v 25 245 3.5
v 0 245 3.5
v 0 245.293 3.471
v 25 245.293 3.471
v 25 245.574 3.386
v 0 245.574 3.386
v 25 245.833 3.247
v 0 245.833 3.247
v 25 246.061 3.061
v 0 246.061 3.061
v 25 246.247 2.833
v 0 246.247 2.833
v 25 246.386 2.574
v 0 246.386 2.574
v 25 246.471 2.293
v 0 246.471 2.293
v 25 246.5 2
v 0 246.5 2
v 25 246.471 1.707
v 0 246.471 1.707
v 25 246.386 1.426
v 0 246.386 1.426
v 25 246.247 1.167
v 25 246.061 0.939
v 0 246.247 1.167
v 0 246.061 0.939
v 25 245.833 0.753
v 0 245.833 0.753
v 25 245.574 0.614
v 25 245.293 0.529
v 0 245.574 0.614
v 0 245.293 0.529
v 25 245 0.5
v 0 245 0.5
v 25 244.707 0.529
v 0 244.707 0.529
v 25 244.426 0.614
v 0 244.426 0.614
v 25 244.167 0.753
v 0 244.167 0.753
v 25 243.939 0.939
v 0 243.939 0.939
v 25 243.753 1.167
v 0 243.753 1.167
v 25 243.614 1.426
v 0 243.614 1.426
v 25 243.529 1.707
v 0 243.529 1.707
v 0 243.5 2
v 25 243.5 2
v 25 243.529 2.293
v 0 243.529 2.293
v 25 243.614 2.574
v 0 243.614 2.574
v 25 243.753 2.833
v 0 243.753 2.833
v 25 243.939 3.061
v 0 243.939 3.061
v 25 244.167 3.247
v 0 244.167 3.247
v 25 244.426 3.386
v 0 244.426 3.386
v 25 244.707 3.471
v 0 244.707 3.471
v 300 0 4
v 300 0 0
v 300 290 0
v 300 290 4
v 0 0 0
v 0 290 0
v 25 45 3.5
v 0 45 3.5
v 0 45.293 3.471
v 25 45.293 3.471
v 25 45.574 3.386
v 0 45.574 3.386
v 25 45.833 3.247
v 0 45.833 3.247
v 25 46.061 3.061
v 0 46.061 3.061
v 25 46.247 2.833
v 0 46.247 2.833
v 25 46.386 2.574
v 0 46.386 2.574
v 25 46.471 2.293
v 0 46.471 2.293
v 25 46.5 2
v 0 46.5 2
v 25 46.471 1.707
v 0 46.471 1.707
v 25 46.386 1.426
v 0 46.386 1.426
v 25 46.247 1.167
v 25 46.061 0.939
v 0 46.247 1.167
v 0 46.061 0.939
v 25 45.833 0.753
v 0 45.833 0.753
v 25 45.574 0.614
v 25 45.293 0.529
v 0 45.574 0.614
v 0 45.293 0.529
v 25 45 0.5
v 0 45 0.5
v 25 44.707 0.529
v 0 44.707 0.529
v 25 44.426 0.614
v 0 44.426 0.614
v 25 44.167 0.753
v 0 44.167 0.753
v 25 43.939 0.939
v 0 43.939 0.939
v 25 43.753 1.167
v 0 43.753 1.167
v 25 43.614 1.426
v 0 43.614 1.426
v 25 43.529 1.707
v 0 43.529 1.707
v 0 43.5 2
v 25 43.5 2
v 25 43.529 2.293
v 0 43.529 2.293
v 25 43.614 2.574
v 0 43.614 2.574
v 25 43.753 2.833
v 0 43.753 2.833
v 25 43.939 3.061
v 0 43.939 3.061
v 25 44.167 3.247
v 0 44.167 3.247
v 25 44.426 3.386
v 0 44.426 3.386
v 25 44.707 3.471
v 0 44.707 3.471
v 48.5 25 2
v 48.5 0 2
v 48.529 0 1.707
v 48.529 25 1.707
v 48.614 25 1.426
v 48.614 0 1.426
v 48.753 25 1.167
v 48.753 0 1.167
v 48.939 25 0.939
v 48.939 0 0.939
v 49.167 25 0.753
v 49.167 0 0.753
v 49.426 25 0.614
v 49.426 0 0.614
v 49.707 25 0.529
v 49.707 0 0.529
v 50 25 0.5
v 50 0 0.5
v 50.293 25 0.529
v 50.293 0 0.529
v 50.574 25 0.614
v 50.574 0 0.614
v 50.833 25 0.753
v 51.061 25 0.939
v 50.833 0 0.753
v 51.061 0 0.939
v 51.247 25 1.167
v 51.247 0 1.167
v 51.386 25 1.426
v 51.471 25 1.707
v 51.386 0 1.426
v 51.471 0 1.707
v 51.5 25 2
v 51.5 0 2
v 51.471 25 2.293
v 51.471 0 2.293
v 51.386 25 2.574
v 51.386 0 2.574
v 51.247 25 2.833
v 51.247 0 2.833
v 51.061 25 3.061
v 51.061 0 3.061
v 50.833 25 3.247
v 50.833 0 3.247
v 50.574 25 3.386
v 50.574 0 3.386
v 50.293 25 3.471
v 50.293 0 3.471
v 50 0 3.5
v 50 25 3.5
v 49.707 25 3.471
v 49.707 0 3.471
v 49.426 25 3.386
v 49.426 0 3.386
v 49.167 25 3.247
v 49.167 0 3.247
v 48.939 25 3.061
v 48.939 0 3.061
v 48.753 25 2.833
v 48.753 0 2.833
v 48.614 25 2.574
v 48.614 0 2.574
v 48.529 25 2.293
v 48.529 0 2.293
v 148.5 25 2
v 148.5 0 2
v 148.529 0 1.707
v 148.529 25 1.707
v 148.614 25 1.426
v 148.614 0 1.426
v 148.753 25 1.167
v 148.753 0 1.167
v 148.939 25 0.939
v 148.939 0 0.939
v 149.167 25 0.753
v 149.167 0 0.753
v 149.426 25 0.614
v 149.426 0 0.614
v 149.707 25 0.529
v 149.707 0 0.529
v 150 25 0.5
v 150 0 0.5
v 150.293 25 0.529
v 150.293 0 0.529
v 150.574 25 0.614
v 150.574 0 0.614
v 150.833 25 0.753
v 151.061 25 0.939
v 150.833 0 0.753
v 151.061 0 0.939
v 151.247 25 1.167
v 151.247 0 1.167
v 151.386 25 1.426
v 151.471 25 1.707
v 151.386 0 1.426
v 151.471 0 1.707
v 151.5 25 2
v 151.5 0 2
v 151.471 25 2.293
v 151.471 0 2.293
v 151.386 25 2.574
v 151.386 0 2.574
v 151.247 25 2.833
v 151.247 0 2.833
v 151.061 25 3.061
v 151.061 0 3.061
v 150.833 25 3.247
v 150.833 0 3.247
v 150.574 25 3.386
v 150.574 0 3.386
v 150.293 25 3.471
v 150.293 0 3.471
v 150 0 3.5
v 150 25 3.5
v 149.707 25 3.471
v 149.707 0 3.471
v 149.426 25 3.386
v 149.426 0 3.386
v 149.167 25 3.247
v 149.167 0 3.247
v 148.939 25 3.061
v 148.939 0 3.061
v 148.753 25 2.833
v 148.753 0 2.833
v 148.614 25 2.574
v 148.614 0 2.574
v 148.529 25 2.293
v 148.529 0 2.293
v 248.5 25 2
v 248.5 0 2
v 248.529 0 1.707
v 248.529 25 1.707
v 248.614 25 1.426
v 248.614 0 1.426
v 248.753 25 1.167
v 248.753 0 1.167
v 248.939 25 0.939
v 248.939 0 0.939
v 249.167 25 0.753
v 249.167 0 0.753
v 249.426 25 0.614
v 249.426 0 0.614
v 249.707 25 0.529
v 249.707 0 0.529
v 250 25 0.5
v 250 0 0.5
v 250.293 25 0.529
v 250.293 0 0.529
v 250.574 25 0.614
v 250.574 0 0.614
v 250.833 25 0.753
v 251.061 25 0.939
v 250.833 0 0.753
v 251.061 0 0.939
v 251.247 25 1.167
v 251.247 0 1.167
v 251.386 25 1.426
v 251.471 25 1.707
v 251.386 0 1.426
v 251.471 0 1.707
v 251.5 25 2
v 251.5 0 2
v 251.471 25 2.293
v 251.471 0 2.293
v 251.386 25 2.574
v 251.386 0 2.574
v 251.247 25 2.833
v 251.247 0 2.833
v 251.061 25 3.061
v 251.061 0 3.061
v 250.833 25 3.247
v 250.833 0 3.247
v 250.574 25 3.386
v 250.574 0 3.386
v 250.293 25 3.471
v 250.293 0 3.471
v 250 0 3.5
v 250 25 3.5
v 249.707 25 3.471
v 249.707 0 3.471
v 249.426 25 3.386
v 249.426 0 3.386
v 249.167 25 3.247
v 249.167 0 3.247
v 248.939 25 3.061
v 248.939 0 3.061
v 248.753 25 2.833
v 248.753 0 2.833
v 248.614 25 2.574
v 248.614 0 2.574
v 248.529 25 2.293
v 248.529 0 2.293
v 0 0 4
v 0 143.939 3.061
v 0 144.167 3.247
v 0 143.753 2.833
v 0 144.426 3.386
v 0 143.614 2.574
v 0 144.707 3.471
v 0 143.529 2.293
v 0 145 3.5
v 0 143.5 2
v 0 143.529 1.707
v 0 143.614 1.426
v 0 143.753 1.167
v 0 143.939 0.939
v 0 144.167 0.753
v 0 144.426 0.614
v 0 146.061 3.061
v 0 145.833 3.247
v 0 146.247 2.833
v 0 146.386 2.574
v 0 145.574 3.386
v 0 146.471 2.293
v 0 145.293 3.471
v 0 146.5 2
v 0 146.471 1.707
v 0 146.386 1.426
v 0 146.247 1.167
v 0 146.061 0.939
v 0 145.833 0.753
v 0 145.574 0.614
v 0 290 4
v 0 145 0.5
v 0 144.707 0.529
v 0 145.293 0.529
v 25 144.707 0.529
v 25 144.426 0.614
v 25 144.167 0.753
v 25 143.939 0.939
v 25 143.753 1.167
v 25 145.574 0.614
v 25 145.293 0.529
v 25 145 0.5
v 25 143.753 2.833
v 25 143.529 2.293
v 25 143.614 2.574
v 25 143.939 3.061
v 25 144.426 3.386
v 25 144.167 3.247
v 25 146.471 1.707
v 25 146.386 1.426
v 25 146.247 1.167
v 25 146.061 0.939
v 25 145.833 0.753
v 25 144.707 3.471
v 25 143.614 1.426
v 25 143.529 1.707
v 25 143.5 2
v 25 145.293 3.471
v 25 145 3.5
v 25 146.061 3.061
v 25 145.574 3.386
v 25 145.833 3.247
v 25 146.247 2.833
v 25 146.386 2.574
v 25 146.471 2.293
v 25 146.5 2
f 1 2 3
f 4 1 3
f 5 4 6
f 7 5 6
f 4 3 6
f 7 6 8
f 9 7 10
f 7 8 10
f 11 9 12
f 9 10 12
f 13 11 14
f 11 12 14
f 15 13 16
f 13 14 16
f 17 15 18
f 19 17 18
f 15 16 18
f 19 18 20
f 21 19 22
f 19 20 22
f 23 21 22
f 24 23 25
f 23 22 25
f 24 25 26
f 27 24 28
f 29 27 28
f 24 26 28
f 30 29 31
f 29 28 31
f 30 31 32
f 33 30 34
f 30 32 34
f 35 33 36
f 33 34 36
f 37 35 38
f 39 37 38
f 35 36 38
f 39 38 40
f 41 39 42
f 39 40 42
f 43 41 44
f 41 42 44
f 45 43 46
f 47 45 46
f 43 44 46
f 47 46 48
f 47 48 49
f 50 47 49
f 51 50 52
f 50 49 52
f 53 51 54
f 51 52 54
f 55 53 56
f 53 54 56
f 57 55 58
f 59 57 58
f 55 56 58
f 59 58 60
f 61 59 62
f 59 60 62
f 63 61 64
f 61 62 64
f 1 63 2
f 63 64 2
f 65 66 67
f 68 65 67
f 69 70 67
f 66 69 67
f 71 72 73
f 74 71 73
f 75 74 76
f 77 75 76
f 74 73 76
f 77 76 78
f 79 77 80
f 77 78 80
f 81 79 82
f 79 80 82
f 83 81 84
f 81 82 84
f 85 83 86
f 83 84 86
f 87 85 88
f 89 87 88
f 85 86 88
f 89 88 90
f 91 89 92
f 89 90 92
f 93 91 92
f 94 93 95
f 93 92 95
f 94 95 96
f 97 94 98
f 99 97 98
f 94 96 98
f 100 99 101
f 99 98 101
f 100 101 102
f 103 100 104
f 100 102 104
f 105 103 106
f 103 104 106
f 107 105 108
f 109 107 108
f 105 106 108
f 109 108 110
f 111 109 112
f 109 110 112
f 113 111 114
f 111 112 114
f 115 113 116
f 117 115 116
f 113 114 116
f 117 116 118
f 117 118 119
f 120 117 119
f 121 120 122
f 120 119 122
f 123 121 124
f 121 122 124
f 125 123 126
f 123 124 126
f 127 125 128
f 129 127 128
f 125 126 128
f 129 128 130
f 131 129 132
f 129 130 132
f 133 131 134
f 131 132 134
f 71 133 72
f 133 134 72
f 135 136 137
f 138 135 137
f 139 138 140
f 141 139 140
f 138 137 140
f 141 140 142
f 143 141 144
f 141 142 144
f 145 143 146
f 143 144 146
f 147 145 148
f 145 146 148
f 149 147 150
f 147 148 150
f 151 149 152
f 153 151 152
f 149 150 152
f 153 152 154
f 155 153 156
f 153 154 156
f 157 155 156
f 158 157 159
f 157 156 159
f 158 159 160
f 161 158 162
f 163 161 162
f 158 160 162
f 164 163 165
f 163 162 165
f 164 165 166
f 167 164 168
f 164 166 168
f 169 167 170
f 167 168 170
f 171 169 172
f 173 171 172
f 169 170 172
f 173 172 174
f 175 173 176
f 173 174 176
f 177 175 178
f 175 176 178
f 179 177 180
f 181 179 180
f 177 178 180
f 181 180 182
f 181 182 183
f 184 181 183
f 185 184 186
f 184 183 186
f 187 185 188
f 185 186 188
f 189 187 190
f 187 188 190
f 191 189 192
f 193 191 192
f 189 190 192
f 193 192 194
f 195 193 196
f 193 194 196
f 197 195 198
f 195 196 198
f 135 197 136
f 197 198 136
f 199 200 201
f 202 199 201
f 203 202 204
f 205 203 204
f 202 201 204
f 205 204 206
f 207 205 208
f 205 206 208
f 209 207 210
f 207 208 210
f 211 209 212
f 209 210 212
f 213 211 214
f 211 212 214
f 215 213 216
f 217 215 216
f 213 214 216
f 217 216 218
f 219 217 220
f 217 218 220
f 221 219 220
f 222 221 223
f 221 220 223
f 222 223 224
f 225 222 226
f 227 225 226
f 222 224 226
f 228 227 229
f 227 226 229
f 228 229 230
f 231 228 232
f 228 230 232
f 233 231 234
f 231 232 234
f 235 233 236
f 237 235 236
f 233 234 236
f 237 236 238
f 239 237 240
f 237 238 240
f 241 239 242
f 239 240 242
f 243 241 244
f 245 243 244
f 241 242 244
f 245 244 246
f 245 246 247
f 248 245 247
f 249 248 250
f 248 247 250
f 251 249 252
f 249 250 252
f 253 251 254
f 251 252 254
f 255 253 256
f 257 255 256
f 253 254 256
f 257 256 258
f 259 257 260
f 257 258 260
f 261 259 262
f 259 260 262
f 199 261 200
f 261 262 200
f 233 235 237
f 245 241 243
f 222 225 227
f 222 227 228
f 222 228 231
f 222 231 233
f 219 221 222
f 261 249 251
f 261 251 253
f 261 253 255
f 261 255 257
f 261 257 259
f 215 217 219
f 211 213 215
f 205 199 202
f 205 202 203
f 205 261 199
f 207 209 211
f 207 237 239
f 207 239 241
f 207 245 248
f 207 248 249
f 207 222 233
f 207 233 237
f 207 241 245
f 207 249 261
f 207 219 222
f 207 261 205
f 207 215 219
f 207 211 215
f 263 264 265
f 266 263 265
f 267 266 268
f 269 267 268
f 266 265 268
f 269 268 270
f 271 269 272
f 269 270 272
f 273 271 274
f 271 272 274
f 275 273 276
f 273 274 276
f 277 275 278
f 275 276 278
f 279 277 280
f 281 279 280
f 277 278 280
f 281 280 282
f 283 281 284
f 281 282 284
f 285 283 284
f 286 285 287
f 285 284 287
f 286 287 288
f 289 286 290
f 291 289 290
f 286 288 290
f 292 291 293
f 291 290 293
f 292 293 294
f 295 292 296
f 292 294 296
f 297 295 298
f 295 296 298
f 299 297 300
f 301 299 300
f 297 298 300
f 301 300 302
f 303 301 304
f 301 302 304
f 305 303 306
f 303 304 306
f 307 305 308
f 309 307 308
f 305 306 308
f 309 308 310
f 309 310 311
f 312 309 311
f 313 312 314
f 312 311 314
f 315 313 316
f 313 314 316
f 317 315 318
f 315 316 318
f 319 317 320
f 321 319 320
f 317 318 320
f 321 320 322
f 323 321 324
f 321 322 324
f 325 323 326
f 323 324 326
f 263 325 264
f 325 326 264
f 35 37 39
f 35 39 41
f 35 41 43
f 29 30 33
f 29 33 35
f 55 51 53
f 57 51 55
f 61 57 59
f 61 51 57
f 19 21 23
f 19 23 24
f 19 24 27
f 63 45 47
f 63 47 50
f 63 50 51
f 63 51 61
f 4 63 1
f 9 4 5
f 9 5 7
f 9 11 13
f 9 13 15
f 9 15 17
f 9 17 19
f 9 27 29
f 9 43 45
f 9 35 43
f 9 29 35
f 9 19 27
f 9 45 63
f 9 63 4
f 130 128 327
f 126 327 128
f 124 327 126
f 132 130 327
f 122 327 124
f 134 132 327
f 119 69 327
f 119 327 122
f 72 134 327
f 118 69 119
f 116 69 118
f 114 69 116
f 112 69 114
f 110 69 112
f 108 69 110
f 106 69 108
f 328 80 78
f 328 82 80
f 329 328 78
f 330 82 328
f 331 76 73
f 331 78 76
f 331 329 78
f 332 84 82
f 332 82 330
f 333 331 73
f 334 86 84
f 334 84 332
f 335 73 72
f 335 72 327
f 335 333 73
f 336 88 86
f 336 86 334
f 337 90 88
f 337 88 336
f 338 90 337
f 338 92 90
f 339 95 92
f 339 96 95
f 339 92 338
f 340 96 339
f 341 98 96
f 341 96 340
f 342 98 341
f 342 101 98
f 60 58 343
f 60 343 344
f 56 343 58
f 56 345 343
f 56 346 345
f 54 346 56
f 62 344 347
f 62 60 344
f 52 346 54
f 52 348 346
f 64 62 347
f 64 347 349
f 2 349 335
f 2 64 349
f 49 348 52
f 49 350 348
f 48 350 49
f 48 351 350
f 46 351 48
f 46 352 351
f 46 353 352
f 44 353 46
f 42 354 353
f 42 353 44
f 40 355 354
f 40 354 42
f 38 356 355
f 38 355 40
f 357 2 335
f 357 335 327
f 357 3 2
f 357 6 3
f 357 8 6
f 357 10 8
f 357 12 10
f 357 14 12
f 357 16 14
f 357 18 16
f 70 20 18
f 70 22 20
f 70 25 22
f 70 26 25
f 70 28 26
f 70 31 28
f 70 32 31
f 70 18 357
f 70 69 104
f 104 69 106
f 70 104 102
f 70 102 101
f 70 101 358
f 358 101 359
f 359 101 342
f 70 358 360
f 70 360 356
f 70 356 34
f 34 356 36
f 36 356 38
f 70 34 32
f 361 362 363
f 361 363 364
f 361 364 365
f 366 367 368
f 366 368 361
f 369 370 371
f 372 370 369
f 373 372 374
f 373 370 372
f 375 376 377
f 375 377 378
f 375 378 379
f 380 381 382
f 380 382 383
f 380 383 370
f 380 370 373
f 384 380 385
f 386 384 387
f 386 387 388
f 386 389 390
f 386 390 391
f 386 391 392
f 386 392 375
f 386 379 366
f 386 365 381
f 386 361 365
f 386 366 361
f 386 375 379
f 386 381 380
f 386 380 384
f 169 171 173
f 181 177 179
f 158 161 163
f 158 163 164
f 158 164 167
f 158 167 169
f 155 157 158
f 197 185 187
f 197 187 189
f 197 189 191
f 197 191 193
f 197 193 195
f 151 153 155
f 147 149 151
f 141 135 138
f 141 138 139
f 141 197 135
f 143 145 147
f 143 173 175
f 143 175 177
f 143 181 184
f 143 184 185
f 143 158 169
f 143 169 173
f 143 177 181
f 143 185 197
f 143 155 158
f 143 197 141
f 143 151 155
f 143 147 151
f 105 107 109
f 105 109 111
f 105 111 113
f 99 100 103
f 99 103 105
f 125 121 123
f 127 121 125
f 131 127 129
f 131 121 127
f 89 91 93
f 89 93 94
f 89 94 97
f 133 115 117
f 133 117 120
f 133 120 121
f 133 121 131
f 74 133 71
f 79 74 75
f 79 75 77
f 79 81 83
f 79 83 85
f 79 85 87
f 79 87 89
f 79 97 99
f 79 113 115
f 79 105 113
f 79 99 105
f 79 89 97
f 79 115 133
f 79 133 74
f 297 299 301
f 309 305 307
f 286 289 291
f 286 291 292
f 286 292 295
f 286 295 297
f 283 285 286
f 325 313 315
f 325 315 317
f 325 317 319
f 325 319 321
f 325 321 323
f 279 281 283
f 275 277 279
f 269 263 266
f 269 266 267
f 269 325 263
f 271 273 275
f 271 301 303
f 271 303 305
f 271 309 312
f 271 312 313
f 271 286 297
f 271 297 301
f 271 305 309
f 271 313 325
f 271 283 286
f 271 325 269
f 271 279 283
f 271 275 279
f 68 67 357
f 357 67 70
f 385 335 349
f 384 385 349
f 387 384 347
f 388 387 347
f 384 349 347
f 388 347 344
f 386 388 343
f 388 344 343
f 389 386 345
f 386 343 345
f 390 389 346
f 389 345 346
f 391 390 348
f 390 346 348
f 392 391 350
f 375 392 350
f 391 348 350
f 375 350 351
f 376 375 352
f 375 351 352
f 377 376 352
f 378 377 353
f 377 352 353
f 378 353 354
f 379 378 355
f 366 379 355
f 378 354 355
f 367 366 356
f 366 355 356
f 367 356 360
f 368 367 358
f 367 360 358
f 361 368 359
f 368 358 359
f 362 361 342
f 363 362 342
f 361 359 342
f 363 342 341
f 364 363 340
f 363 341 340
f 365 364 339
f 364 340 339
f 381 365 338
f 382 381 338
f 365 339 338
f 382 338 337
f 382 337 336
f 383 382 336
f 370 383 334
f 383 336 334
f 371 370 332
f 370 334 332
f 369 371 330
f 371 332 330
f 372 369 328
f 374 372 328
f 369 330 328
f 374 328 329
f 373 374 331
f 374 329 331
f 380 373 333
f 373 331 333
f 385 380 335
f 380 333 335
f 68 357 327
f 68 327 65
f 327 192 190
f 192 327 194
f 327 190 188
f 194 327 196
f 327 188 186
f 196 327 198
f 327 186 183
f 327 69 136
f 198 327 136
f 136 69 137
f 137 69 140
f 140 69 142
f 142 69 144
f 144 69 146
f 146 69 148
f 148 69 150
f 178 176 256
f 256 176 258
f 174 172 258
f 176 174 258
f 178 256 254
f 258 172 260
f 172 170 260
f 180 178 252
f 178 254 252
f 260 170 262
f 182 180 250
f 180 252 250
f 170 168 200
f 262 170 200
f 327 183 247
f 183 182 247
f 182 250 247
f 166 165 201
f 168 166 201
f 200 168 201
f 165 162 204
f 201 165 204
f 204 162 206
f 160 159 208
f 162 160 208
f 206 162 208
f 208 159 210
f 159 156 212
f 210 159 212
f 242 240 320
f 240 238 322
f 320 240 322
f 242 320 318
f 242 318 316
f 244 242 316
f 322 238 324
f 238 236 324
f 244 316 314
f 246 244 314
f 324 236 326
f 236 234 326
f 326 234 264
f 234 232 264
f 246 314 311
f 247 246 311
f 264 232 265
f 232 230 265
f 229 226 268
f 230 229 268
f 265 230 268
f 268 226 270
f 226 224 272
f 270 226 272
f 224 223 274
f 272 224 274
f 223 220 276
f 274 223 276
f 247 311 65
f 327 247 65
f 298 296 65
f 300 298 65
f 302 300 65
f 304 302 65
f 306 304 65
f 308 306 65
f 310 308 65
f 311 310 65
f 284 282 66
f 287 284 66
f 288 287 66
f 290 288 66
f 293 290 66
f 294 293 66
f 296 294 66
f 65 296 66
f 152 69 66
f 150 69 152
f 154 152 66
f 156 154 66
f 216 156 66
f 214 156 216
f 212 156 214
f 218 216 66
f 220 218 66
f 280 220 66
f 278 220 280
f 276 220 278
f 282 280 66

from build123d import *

# Parameters (mm, degrees)
SKETCH1_W           = 300
SKETCH1_H           = 300
BOSS_EXTRUDE1_DEPTH = 4
SKETCH2_R           = 1.5
CUT_EXTRUDE1_DEPTH  = 25
SKETCH3_W           = 300
SKETCH3_H           = 10
CUT_EXTRUDE2_DEPTH  = 5
SKETCH4_R           = 1.5
CUT_EXTRUDE3_DEPTH  = 25


with BuildPart() as part:
    # Sketch1 → Boss-Extrude1 (new body)
    with BuildSketch(Plane.XY):
        with Locations((150, 150)):
            Rectangle(SKETCH1_W, SKETCH1_H)
    extrude(amount=BOSS_EXTRUDE1_DEPTH)

    # Sketch2 → Cut-Extrude1 (cut)
    with BuildSketch(Plane(origin=(0, 0, 0), x_dir=(-1, 0, 0), z_dir=(0, -1, 0))):
        with Locations((-50, -2)):
            Circle(SKETCH2_R)
        with Locations((-250, -2)):
            Circle(SKETCH2_R)
        with Locations((-150, -2)):
            Circle(SKETCH2_R)
    extrude(amount=-CUT_EXTRUDE1_DEPTH, mode=Mode.SUBTRACT)

    # Sketch3 → Cut-Extrude2 (cut, through all)
    with BuildSketch(Plane(origin=(0, 0, 0), x_dir=(-1, 0, 0), z_dir=(0, 0, -1))):
        with Locations((-150, 295)):
            Rectangle(SKETCH3_W, SKETCH3_H)
    extrude(amount=-CUT_EXTRUDE2_DEPTH, mode=Mode.SUBTRACT)

    # Sketch4 → Cut-Extrude3 (cut)
    with BuildSketch(Plane.ZY):
        with Locations((2, 245)):
            Circle(SKETCH4_R)
        with Locations((2, 45)):
            Circle(SKETCH4_R)
        with Locations((2, 145)):
            Circle(SKETCH4_R)
    extrude(amount=-CUT_EXTRUDE3_DEPTH, mode=Mode.SUBTRACT)


solid = part.part
